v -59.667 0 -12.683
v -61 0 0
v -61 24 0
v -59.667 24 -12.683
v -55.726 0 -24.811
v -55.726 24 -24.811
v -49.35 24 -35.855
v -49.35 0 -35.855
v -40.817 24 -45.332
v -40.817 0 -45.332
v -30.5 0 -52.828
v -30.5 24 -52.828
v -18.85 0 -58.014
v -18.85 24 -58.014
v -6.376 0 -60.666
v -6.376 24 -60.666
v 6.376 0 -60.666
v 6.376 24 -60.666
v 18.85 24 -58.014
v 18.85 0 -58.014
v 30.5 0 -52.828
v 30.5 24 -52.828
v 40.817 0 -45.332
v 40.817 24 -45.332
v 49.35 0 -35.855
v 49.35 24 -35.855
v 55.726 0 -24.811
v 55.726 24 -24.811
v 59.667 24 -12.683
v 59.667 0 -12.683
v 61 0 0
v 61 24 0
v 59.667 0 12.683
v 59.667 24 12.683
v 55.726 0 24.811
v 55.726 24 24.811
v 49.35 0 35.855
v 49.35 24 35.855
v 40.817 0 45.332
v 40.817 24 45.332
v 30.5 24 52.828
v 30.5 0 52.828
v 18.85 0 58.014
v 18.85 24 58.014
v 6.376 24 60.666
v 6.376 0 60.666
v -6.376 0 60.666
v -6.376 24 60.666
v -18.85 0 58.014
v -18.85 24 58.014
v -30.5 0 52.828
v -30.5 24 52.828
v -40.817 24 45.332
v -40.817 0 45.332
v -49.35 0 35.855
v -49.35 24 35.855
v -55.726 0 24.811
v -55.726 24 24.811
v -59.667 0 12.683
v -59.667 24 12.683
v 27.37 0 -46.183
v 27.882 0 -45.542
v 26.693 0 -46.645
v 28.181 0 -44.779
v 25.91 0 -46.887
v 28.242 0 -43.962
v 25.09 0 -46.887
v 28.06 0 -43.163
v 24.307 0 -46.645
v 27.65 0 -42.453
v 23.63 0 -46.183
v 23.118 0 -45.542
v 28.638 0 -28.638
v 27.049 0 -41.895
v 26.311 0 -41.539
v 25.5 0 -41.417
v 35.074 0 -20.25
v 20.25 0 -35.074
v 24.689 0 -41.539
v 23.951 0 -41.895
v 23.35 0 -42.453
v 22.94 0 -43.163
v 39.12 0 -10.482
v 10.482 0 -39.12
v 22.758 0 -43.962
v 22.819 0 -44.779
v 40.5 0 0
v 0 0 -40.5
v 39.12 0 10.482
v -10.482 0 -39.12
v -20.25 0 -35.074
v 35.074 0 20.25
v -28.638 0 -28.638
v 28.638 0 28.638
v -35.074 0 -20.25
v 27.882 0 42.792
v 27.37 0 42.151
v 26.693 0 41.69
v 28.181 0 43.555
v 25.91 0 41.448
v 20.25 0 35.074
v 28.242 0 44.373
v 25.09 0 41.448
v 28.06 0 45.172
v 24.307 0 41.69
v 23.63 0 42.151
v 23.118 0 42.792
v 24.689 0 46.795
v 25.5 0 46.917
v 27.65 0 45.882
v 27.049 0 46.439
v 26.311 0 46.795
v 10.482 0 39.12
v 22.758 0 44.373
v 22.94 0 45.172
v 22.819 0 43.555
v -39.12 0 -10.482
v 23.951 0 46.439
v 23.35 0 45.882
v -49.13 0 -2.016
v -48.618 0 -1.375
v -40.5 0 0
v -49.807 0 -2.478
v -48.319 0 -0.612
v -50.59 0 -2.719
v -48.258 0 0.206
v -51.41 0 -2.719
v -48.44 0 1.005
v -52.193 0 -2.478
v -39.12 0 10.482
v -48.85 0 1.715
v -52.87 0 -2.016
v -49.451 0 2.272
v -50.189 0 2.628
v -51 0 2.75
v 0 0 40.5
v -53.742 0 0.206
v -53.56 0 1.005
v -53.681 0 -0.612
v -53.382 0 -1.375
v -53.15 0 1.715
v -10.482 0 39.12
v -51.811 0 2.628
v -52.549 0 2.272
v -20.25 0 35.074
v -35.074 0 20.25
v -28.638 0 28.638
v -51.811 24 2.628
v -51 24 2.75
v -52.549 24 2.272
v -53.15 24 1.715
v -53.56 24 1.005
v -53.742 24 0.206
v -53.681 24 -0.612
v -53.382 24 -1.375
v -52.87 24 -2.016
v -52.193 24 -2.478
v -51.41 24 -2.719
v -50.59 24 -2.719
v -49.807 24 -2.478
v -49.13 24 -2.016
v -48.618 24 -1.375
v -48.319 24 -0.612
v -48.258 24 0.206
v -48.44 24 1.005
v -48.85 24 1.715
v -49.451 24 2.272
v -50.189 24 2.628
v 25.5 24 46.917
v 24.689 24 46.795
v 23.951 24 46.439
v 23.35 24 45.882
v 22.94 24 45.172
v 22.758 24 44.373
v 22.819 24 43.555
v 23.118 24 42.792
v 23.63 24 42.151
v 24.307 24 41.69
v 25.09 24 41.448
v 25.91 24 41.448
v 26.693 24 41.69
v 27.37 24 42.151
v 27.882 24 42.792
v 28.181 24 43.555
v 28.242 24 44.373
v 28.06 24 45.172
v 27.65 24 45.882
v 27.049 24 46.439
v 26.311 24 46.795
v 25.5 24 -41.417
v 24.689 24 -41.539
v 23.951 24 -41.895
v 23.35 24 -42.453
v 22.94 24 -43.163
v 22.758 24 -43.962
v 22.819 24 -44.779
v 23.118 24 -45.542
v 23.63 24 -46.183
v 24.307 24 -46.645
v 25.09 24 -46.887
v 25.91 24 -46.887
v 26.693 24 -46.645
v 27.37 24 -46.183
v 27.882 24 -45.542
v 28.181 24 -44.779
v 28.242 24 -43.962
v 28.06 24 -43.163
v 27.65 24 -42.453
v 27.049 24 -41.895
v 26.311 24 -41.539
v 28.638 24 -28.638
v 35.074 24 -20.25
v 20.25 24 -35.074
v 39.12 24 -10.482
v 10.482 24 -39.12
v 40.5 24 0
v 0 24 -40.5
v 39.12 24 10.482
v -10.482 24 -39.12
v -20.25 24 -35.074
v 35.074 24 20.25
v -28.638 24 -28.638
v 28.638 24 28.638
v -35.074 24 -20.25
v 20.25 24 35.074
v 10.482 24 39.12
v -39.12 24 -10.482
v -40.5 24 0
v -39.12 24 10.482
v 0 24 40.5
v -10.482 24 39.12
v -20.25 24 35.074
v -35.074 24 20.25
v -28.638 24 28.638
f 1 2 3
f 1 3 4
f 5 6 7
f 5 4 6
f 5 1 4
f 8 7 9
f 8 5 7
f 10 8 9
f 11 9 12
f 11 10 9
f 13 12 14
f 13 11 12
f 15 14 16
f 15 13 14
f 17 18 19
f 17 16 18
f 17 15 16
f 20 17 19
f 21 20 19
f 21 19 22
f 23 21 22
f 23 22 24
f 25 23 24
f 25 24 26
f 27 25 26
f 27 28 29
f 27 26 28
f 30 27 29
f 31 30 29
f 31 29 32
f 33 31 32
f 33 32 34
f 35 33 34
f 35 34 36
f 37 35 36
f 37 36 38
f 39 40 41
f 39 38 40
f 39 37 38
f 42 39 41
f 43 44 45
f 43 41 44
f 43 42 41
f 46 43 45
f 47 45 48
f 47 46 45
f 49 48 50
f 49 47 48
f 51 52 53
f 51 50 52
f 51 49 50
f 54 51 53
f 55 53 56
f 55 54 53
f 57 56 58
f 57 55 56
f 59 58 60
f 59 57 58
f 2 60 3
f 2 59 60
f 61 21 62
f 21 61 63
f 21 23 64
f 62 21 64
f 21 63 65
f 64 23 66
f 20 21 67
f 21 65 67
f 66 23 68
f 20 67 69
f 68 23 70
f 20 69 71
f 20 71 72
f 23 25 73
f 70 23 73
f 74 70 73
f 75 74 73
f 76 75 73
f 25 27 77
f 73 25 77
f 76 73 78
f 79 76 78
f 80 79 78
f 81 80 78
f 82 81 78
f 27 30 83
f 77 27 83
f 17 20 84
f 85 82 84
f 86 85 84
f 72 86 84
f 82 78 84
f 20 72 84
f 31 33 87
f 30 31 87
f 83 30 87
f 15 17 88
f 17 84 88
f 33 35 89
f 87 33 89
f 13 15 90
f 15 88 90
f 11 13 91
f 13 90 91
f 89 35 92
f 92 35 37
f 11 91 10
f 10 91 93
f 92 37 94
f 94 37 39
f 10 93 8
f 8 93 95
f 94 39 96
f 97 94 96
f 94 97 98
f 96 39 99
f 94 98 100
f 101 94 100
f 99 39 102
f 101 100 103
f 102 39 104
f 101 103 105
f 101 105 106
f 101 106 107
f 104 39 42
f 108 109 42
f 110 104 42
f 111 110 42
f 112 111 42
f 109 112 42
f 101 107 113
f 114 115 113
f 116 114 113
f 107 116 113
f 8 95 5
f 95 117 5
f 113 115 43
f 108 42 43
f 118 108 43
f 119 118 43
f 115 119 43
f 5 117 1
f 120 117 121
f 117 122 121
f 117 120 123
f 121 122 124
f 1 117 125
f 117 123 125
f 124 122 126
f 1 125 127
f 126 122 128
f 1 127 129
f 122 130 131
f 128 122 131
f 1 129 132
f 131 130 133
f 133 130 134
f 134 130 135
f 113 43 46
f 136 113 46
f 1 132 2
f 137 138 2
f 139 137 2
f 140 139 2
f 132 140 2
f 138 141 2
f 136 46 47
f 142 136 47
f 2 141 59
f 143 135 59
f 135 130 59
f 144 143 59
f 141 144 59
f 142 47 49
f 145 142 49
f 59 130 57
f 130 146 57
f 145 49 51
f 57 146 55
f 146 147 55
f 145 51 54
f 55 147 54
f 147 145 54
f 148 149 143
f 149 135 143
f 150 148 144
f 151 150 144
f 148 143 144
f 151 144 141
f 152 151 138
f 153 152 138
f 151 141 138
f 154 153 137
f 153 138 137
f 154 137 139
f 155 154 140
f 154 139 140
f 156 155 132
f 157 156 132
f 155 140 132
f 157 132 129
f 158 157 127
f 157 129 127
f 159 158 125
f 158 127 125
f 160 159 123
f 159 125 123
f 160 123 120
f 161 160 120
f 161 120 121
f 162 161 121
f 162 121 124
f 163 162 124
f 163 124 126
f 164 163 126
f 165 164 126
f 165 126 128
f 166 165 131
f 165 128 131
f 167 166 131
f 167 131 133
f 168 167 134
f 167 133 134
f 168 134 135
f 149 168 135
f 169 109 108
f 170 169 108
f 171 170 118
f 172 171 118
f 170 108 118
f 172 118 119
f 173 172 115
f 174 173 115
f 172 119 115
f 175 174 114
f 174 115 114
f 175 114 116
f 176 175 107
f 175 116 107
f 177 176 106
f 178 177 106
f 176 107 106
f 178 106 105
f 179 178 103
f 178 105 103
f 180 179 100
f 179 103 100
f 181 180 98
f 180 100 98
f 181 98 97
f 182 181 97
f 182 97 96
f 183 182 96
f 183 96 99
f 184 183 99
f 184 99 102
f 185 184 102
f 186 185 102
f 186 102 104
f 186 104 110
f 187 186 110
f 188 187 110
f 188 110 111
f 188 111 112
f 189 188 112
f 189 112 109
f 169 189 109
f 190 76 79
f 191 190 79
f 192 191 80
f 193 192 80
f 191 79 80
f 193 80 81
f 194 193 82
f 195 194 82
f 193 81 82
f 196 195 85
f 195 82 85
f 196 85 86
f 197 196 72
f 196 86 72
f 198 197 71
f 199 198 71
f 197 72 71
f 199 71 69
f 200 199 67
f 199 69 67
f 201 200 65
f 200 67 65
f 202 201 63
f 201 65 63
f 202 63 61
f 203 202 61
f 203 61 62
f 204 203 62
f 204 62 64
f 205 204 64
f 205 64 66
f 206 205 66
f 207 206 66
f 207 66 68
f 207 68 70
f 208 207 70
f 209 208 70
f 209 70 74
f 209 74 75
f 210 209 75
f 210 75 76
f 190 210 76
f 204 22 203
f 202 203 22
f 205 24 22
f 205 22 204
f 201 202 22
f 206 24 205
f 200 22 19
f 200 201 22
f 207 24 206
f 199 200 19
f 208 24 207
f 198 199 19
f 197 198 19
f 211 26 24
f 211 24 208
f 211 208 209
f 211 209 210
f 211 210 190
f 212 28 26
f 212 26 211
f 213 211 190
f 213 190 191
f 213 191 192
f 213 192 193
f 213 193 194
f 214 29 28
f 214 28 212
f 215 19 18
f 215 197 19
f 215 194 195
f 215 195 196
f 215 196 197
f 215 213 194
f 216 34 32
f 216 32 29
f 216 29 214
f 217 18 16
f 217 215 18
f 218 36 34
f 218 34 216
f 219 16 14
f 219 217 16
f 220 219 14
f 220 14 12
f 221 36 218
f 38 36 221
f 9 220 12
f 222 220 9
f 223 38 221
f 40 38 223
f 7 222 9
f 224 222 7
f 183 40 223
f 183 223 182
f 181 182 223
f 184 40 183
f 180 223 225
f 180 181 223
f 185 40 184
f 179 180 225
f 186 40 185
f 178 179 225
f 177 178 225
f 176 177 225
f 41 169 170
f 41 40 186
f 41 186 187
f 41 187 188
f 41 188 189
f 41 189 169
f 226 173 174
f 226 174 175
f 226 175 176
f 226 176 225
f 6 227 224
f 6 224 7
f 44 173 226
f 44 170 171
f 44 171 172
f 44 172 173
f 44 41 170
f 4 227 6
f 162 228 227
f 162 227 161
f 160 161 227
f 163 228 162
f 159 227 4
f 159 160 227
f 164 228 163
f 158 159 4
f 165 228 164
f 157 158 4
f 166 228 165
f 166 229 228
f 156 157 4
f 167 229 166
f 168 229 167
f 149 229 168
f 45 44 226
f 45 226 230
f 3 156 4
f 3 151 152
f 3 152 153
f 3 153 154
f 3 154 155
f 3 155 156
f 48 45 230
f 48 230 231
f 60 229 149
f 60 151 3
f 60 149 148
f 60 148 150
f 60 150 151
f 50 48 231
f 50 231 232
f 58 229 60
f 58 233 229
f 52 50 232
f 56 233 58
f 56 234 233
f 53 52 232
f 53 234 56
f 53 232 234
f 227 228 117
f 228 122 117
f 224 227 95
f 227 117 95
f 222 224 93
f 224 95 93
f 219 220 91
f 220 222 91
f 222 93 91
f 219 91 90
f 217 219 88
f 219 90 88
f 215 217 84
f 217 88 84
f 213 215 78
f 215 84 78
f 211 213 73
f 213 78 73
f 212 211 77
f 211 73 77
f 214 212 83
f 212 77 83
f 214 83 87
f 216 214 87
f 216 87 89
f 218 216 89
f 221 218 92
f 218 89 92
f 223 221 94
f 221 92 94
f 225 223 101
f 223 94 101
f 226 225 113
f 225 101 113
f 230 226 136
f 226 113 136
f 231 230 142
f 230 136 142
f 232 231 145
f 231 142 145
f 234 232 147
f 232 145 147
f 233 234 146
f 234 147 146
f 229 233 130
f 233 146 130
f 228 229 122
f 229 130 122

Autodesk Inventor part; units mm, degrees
ref_plane "YZ Plane" through (0, 0, 0) normal (1, 0, 0) x (0, 1, 0)
ref_plane "XZ Plane" through (0, 0, 0) normal (0, 1, 0) x (-1, 0, 0)
ref_plane "XY Plane" through (0, 0, 0) normal (0, 0, 1) x (1, 0, 0)
sketch "Sketch1" plane through (0, 0, 0) normal (0, 1, 0) x (-1, 0, 0)
  circle A0 centre (0, 0) radius 40.5
  circle A1 centre (0, 0) radius 61
  dimension "d0" = 81
  dimension "d1" = 122
extrude "Extrusion1" add sketch "Sketch1" along normal blind 24
sketch "Sketch2" plane through (0, 24, 0) normal (0, 1, 0) x (1, 0, 0)
  circle A0 centre (0, 0) radius 51 construction
  point P0 (-51, 0)
  point P1 (25.5, -44.1673)
  point P2 (25.5, 44.1673)
  dimension "d4" = 102
  dimension "d7" = 360
hole "Hole1" at (-51, 24, 0) at (25.5, 24, 44.1673) at (25.5, 24, -44.1673) direction (0, -1, 0) diameter 5.5 end through all
properties part number "Adapter"
